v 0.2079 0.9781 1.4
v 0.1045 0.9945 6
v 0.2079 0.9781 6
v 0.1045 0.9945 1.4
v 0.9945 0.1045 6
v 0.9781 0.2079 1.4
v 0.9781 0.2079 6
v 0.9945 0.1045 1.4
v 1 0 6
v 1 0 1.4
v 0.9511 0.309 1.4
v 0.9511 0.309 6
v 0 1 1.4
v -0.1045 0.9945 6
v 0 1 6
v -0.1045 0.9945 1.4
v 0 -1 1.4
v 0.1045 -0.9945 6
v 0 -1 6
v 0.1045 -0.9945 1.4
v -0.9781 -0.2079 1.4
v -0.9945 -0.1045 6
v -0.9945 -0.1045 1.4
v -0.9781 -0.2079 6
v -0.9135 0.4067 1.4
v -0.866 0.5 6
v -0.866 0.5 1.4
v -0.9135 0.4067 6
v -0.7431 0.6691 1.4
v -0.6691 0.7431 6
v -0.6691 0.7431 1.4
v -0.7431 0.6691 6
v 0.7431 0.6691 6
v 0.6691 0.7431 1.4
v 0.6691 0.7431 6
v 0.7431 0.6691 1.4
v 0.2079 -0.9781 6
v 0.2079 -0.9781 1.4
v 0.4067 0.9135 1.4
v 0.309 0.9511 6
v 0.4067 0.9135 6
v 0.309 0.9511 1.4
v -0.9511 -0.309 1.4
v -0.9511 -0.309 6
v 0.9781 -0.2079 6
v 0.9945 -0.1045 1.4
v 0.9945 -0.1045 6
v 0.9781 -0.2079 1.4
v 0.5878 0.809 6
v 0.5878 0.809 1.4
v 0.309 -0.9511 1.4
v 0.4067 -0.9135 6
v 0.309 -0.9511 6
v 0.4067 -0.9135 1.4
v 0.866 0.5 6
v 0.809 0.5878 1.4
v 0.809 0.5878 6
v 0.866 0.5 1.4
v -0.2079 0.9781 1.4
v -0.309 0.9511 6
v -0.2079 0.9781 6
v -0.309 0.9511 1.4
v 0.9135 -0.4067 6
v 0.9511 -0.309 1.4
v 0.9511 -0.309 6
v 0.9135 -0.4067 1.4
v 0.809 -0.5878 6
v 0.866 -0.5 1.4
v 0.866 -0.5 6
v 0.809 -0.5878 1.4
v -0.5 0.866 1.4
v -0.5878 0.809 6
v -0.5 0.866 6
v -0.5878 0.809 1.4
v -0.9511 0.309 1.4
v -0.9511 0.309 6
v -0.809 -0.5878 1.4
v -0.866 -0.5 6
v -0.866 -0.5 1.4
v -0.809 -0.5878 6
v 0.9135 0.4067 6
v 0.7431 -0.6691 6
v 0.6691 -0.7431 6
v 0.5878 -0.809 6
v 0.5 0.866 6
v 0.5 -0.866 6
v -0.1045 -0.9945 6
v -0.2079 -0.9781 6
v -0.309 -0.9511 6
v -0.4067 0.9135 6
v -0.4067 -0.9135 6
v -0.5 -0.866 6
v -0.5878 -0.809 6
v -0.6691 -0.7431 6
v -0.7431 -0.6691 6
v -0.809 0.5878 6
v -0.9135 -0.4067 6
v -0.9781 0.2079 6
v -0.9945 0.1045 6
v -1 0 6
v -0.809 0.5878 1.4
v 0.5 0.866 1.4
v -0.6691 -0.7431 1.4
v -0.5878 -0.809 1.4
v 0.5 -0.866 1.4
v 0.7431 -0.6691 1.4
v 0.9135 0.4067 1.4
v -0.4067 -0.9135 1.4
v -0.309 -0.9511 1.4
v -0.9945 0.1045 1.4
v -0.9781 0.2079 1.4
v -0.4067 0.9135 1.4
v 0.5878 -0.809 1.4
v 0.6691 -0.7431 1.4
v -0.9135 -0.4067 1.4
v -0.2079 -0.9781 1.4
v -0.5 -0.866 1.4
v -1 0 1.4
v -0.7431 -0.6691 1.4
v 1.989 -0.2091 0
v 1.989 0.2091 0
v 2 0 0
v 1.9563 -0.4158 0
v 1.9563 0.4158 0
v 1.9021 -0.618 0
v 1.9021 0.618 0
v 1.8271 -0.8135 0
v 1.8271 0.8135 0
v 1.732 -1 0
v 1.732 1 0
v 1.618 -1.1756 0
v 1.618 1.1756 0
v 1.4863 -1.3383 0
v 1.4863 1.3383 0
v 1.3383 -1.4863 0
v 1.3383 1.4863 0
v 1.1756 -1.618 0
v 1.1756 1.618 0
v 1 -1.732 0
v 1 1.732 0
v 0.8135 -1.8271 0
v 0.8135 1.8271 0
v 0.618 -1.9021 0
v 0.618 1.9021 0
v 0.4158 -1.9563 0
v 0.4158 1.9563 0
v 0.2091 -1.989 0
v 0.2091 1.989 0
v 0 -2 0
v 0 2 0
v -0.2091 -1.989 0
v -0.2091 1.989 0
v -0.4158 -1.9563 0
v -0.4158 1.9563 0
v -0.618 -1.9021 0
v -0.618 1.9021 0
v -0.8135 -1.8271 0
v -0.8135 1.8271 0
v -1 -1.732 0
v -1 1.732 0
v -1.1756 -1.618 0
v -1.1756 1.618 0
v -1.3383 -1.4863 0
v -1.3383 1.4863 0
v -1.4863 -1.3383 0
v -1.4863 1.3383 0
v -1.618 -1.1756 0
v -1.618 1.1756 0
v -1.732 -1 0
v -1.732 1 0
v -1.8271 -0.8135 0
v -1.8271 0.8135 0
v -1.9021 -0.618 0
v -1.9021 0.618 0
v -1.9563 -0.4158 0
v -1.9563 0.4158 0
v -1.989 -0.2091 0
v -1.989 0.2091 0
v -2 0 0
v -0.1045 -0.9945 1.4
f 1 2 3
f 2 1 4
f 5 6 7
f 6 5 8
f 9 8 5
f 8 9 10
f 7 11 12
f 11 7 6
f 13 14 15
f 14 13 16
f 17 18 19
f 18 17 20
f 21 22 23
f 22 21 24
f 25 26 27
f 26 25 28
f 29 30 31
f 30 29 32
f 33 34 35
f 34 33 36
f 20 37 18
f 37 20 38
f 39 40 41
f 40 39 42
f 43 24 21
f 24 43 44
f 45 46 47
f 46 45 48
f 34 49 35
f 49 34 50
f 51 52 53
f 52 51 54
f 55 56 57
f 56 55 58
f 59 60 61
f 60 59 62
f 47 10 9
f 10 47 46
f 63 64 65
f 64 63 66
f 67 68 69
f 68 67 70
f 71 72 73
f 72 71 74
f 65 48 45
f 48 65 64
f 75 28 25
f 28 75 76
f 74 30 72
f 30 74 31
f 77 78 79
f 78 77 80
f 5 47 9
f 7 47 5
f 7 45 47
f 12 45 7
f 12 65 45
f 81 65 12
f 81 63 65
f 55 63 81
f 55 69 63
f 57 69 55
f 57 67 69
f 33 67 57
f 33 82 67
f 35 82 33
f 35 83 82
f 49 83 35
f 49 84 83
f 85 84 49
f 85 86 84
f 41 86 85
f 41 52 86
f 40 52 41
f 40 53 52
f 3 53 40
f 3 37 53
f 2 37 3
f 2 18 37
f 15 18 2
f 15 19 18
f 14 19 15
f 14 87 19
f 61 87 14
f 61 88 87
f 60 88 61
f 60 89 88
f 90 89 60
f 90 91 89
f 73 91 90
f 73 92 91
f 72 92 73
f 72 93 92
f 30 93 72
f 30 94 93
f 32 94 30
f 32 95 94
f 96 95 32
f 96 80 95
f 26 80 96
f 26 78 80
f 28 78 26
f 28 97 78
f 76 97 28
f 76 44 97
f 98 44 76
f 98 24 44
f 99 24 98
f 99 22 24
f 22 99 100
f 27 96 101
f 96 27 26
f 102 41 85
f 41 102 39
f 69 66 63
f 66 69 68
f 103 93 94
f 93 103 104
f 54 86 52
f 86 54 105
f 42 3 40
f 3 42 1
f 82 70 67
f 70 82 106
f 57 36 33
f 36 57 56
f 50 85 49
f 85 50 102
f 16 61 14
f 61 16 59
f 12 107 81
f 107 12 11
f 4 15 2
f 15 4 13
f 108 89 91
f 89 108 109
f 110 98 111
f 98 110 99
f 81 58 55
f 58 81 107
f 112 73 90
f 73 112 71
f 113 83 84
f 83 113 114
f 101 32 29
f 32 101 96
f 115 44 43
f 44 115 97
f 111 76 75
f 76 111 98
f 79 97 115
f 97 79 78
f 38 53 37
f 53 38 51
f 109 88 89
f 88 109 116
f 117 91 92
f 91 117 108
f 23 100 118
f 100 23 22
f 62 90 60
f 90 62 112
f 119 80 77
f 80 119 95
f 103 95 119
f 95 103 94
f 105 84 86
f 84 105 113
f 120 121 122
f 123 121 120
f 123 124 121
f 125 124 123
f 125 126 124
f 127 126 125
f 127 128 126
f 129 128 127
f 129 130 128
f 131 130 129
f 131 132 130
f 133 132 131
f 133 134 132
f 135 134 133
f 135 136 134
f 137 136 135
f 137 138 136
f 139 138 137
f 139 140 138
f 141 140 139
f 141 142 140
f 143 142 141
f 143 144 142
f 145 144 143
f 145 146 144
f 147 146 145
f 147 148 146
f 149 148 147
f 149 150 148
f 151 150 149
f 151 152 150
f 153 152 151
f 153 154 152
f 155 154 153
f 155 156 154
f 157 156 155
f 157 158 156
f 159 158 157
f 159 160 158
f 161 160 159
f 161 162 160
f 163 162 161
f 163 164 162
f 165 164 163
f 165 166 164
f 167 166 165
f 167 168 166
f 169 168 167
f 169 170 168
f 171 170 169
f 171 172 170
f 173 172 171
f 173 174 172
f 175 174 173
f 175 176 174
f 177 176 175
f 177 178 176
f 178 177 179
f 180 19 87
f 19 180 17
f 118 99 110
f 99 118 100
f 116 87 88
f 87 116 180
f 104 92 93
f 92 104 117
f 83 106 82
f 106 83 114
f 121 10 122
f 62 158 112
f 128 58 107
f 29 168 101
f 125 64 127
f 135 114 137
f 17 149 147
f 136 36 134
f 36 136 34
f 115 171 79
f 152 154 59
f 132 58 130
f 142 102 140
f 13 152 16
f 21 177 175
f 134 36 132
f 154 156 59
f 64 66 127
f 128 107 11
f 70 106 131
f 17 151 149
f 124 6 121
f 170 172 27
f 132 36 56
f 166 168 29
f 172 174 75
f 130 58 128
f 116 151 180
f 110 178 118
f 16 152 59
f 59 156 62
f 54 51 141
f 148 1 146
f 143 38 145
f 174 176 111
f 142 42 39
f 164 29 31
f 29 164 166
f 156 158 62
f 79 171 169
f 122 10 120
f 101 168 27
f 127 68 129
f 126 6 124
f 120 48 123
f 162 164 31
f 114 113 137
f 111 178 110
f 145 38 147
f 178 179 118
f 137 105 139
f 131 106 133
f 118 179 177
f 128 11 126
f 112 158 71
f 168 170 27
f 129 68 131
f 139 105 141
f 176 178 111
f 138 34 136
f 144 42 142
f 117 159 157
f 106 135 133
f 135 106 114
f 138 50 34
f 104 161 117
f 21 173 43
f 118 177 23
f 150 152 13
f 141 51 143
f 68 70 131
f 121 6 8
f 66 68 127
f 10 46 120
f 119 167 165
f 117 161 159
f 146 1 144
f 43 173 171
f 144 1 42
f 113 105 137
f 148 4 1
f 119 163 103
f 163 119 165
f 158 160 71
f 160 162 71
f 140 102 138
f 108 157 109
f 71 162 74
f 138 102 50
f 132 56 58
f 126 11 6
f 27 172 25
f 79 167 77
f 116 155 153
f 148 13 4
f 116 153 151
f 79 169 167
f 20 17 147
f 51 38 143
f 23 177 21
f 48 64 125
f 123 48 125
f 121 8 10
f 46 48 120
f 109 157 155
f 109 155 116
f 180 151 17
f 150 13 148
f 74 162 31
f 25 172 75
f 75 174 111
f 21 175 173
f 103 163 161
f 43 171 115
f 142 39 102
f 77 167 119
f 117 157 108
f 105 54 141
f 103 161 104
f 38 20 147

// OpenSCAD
// Solid rivet.
$fn = 60;
eps = 0.02;
shank_d = 2;
head_d = 4;
length = 6;
union() { cylinder(d=shank_d,h=length); cylinder(d1=head_d,d2=shank_d,h=head_d*0.35); }
